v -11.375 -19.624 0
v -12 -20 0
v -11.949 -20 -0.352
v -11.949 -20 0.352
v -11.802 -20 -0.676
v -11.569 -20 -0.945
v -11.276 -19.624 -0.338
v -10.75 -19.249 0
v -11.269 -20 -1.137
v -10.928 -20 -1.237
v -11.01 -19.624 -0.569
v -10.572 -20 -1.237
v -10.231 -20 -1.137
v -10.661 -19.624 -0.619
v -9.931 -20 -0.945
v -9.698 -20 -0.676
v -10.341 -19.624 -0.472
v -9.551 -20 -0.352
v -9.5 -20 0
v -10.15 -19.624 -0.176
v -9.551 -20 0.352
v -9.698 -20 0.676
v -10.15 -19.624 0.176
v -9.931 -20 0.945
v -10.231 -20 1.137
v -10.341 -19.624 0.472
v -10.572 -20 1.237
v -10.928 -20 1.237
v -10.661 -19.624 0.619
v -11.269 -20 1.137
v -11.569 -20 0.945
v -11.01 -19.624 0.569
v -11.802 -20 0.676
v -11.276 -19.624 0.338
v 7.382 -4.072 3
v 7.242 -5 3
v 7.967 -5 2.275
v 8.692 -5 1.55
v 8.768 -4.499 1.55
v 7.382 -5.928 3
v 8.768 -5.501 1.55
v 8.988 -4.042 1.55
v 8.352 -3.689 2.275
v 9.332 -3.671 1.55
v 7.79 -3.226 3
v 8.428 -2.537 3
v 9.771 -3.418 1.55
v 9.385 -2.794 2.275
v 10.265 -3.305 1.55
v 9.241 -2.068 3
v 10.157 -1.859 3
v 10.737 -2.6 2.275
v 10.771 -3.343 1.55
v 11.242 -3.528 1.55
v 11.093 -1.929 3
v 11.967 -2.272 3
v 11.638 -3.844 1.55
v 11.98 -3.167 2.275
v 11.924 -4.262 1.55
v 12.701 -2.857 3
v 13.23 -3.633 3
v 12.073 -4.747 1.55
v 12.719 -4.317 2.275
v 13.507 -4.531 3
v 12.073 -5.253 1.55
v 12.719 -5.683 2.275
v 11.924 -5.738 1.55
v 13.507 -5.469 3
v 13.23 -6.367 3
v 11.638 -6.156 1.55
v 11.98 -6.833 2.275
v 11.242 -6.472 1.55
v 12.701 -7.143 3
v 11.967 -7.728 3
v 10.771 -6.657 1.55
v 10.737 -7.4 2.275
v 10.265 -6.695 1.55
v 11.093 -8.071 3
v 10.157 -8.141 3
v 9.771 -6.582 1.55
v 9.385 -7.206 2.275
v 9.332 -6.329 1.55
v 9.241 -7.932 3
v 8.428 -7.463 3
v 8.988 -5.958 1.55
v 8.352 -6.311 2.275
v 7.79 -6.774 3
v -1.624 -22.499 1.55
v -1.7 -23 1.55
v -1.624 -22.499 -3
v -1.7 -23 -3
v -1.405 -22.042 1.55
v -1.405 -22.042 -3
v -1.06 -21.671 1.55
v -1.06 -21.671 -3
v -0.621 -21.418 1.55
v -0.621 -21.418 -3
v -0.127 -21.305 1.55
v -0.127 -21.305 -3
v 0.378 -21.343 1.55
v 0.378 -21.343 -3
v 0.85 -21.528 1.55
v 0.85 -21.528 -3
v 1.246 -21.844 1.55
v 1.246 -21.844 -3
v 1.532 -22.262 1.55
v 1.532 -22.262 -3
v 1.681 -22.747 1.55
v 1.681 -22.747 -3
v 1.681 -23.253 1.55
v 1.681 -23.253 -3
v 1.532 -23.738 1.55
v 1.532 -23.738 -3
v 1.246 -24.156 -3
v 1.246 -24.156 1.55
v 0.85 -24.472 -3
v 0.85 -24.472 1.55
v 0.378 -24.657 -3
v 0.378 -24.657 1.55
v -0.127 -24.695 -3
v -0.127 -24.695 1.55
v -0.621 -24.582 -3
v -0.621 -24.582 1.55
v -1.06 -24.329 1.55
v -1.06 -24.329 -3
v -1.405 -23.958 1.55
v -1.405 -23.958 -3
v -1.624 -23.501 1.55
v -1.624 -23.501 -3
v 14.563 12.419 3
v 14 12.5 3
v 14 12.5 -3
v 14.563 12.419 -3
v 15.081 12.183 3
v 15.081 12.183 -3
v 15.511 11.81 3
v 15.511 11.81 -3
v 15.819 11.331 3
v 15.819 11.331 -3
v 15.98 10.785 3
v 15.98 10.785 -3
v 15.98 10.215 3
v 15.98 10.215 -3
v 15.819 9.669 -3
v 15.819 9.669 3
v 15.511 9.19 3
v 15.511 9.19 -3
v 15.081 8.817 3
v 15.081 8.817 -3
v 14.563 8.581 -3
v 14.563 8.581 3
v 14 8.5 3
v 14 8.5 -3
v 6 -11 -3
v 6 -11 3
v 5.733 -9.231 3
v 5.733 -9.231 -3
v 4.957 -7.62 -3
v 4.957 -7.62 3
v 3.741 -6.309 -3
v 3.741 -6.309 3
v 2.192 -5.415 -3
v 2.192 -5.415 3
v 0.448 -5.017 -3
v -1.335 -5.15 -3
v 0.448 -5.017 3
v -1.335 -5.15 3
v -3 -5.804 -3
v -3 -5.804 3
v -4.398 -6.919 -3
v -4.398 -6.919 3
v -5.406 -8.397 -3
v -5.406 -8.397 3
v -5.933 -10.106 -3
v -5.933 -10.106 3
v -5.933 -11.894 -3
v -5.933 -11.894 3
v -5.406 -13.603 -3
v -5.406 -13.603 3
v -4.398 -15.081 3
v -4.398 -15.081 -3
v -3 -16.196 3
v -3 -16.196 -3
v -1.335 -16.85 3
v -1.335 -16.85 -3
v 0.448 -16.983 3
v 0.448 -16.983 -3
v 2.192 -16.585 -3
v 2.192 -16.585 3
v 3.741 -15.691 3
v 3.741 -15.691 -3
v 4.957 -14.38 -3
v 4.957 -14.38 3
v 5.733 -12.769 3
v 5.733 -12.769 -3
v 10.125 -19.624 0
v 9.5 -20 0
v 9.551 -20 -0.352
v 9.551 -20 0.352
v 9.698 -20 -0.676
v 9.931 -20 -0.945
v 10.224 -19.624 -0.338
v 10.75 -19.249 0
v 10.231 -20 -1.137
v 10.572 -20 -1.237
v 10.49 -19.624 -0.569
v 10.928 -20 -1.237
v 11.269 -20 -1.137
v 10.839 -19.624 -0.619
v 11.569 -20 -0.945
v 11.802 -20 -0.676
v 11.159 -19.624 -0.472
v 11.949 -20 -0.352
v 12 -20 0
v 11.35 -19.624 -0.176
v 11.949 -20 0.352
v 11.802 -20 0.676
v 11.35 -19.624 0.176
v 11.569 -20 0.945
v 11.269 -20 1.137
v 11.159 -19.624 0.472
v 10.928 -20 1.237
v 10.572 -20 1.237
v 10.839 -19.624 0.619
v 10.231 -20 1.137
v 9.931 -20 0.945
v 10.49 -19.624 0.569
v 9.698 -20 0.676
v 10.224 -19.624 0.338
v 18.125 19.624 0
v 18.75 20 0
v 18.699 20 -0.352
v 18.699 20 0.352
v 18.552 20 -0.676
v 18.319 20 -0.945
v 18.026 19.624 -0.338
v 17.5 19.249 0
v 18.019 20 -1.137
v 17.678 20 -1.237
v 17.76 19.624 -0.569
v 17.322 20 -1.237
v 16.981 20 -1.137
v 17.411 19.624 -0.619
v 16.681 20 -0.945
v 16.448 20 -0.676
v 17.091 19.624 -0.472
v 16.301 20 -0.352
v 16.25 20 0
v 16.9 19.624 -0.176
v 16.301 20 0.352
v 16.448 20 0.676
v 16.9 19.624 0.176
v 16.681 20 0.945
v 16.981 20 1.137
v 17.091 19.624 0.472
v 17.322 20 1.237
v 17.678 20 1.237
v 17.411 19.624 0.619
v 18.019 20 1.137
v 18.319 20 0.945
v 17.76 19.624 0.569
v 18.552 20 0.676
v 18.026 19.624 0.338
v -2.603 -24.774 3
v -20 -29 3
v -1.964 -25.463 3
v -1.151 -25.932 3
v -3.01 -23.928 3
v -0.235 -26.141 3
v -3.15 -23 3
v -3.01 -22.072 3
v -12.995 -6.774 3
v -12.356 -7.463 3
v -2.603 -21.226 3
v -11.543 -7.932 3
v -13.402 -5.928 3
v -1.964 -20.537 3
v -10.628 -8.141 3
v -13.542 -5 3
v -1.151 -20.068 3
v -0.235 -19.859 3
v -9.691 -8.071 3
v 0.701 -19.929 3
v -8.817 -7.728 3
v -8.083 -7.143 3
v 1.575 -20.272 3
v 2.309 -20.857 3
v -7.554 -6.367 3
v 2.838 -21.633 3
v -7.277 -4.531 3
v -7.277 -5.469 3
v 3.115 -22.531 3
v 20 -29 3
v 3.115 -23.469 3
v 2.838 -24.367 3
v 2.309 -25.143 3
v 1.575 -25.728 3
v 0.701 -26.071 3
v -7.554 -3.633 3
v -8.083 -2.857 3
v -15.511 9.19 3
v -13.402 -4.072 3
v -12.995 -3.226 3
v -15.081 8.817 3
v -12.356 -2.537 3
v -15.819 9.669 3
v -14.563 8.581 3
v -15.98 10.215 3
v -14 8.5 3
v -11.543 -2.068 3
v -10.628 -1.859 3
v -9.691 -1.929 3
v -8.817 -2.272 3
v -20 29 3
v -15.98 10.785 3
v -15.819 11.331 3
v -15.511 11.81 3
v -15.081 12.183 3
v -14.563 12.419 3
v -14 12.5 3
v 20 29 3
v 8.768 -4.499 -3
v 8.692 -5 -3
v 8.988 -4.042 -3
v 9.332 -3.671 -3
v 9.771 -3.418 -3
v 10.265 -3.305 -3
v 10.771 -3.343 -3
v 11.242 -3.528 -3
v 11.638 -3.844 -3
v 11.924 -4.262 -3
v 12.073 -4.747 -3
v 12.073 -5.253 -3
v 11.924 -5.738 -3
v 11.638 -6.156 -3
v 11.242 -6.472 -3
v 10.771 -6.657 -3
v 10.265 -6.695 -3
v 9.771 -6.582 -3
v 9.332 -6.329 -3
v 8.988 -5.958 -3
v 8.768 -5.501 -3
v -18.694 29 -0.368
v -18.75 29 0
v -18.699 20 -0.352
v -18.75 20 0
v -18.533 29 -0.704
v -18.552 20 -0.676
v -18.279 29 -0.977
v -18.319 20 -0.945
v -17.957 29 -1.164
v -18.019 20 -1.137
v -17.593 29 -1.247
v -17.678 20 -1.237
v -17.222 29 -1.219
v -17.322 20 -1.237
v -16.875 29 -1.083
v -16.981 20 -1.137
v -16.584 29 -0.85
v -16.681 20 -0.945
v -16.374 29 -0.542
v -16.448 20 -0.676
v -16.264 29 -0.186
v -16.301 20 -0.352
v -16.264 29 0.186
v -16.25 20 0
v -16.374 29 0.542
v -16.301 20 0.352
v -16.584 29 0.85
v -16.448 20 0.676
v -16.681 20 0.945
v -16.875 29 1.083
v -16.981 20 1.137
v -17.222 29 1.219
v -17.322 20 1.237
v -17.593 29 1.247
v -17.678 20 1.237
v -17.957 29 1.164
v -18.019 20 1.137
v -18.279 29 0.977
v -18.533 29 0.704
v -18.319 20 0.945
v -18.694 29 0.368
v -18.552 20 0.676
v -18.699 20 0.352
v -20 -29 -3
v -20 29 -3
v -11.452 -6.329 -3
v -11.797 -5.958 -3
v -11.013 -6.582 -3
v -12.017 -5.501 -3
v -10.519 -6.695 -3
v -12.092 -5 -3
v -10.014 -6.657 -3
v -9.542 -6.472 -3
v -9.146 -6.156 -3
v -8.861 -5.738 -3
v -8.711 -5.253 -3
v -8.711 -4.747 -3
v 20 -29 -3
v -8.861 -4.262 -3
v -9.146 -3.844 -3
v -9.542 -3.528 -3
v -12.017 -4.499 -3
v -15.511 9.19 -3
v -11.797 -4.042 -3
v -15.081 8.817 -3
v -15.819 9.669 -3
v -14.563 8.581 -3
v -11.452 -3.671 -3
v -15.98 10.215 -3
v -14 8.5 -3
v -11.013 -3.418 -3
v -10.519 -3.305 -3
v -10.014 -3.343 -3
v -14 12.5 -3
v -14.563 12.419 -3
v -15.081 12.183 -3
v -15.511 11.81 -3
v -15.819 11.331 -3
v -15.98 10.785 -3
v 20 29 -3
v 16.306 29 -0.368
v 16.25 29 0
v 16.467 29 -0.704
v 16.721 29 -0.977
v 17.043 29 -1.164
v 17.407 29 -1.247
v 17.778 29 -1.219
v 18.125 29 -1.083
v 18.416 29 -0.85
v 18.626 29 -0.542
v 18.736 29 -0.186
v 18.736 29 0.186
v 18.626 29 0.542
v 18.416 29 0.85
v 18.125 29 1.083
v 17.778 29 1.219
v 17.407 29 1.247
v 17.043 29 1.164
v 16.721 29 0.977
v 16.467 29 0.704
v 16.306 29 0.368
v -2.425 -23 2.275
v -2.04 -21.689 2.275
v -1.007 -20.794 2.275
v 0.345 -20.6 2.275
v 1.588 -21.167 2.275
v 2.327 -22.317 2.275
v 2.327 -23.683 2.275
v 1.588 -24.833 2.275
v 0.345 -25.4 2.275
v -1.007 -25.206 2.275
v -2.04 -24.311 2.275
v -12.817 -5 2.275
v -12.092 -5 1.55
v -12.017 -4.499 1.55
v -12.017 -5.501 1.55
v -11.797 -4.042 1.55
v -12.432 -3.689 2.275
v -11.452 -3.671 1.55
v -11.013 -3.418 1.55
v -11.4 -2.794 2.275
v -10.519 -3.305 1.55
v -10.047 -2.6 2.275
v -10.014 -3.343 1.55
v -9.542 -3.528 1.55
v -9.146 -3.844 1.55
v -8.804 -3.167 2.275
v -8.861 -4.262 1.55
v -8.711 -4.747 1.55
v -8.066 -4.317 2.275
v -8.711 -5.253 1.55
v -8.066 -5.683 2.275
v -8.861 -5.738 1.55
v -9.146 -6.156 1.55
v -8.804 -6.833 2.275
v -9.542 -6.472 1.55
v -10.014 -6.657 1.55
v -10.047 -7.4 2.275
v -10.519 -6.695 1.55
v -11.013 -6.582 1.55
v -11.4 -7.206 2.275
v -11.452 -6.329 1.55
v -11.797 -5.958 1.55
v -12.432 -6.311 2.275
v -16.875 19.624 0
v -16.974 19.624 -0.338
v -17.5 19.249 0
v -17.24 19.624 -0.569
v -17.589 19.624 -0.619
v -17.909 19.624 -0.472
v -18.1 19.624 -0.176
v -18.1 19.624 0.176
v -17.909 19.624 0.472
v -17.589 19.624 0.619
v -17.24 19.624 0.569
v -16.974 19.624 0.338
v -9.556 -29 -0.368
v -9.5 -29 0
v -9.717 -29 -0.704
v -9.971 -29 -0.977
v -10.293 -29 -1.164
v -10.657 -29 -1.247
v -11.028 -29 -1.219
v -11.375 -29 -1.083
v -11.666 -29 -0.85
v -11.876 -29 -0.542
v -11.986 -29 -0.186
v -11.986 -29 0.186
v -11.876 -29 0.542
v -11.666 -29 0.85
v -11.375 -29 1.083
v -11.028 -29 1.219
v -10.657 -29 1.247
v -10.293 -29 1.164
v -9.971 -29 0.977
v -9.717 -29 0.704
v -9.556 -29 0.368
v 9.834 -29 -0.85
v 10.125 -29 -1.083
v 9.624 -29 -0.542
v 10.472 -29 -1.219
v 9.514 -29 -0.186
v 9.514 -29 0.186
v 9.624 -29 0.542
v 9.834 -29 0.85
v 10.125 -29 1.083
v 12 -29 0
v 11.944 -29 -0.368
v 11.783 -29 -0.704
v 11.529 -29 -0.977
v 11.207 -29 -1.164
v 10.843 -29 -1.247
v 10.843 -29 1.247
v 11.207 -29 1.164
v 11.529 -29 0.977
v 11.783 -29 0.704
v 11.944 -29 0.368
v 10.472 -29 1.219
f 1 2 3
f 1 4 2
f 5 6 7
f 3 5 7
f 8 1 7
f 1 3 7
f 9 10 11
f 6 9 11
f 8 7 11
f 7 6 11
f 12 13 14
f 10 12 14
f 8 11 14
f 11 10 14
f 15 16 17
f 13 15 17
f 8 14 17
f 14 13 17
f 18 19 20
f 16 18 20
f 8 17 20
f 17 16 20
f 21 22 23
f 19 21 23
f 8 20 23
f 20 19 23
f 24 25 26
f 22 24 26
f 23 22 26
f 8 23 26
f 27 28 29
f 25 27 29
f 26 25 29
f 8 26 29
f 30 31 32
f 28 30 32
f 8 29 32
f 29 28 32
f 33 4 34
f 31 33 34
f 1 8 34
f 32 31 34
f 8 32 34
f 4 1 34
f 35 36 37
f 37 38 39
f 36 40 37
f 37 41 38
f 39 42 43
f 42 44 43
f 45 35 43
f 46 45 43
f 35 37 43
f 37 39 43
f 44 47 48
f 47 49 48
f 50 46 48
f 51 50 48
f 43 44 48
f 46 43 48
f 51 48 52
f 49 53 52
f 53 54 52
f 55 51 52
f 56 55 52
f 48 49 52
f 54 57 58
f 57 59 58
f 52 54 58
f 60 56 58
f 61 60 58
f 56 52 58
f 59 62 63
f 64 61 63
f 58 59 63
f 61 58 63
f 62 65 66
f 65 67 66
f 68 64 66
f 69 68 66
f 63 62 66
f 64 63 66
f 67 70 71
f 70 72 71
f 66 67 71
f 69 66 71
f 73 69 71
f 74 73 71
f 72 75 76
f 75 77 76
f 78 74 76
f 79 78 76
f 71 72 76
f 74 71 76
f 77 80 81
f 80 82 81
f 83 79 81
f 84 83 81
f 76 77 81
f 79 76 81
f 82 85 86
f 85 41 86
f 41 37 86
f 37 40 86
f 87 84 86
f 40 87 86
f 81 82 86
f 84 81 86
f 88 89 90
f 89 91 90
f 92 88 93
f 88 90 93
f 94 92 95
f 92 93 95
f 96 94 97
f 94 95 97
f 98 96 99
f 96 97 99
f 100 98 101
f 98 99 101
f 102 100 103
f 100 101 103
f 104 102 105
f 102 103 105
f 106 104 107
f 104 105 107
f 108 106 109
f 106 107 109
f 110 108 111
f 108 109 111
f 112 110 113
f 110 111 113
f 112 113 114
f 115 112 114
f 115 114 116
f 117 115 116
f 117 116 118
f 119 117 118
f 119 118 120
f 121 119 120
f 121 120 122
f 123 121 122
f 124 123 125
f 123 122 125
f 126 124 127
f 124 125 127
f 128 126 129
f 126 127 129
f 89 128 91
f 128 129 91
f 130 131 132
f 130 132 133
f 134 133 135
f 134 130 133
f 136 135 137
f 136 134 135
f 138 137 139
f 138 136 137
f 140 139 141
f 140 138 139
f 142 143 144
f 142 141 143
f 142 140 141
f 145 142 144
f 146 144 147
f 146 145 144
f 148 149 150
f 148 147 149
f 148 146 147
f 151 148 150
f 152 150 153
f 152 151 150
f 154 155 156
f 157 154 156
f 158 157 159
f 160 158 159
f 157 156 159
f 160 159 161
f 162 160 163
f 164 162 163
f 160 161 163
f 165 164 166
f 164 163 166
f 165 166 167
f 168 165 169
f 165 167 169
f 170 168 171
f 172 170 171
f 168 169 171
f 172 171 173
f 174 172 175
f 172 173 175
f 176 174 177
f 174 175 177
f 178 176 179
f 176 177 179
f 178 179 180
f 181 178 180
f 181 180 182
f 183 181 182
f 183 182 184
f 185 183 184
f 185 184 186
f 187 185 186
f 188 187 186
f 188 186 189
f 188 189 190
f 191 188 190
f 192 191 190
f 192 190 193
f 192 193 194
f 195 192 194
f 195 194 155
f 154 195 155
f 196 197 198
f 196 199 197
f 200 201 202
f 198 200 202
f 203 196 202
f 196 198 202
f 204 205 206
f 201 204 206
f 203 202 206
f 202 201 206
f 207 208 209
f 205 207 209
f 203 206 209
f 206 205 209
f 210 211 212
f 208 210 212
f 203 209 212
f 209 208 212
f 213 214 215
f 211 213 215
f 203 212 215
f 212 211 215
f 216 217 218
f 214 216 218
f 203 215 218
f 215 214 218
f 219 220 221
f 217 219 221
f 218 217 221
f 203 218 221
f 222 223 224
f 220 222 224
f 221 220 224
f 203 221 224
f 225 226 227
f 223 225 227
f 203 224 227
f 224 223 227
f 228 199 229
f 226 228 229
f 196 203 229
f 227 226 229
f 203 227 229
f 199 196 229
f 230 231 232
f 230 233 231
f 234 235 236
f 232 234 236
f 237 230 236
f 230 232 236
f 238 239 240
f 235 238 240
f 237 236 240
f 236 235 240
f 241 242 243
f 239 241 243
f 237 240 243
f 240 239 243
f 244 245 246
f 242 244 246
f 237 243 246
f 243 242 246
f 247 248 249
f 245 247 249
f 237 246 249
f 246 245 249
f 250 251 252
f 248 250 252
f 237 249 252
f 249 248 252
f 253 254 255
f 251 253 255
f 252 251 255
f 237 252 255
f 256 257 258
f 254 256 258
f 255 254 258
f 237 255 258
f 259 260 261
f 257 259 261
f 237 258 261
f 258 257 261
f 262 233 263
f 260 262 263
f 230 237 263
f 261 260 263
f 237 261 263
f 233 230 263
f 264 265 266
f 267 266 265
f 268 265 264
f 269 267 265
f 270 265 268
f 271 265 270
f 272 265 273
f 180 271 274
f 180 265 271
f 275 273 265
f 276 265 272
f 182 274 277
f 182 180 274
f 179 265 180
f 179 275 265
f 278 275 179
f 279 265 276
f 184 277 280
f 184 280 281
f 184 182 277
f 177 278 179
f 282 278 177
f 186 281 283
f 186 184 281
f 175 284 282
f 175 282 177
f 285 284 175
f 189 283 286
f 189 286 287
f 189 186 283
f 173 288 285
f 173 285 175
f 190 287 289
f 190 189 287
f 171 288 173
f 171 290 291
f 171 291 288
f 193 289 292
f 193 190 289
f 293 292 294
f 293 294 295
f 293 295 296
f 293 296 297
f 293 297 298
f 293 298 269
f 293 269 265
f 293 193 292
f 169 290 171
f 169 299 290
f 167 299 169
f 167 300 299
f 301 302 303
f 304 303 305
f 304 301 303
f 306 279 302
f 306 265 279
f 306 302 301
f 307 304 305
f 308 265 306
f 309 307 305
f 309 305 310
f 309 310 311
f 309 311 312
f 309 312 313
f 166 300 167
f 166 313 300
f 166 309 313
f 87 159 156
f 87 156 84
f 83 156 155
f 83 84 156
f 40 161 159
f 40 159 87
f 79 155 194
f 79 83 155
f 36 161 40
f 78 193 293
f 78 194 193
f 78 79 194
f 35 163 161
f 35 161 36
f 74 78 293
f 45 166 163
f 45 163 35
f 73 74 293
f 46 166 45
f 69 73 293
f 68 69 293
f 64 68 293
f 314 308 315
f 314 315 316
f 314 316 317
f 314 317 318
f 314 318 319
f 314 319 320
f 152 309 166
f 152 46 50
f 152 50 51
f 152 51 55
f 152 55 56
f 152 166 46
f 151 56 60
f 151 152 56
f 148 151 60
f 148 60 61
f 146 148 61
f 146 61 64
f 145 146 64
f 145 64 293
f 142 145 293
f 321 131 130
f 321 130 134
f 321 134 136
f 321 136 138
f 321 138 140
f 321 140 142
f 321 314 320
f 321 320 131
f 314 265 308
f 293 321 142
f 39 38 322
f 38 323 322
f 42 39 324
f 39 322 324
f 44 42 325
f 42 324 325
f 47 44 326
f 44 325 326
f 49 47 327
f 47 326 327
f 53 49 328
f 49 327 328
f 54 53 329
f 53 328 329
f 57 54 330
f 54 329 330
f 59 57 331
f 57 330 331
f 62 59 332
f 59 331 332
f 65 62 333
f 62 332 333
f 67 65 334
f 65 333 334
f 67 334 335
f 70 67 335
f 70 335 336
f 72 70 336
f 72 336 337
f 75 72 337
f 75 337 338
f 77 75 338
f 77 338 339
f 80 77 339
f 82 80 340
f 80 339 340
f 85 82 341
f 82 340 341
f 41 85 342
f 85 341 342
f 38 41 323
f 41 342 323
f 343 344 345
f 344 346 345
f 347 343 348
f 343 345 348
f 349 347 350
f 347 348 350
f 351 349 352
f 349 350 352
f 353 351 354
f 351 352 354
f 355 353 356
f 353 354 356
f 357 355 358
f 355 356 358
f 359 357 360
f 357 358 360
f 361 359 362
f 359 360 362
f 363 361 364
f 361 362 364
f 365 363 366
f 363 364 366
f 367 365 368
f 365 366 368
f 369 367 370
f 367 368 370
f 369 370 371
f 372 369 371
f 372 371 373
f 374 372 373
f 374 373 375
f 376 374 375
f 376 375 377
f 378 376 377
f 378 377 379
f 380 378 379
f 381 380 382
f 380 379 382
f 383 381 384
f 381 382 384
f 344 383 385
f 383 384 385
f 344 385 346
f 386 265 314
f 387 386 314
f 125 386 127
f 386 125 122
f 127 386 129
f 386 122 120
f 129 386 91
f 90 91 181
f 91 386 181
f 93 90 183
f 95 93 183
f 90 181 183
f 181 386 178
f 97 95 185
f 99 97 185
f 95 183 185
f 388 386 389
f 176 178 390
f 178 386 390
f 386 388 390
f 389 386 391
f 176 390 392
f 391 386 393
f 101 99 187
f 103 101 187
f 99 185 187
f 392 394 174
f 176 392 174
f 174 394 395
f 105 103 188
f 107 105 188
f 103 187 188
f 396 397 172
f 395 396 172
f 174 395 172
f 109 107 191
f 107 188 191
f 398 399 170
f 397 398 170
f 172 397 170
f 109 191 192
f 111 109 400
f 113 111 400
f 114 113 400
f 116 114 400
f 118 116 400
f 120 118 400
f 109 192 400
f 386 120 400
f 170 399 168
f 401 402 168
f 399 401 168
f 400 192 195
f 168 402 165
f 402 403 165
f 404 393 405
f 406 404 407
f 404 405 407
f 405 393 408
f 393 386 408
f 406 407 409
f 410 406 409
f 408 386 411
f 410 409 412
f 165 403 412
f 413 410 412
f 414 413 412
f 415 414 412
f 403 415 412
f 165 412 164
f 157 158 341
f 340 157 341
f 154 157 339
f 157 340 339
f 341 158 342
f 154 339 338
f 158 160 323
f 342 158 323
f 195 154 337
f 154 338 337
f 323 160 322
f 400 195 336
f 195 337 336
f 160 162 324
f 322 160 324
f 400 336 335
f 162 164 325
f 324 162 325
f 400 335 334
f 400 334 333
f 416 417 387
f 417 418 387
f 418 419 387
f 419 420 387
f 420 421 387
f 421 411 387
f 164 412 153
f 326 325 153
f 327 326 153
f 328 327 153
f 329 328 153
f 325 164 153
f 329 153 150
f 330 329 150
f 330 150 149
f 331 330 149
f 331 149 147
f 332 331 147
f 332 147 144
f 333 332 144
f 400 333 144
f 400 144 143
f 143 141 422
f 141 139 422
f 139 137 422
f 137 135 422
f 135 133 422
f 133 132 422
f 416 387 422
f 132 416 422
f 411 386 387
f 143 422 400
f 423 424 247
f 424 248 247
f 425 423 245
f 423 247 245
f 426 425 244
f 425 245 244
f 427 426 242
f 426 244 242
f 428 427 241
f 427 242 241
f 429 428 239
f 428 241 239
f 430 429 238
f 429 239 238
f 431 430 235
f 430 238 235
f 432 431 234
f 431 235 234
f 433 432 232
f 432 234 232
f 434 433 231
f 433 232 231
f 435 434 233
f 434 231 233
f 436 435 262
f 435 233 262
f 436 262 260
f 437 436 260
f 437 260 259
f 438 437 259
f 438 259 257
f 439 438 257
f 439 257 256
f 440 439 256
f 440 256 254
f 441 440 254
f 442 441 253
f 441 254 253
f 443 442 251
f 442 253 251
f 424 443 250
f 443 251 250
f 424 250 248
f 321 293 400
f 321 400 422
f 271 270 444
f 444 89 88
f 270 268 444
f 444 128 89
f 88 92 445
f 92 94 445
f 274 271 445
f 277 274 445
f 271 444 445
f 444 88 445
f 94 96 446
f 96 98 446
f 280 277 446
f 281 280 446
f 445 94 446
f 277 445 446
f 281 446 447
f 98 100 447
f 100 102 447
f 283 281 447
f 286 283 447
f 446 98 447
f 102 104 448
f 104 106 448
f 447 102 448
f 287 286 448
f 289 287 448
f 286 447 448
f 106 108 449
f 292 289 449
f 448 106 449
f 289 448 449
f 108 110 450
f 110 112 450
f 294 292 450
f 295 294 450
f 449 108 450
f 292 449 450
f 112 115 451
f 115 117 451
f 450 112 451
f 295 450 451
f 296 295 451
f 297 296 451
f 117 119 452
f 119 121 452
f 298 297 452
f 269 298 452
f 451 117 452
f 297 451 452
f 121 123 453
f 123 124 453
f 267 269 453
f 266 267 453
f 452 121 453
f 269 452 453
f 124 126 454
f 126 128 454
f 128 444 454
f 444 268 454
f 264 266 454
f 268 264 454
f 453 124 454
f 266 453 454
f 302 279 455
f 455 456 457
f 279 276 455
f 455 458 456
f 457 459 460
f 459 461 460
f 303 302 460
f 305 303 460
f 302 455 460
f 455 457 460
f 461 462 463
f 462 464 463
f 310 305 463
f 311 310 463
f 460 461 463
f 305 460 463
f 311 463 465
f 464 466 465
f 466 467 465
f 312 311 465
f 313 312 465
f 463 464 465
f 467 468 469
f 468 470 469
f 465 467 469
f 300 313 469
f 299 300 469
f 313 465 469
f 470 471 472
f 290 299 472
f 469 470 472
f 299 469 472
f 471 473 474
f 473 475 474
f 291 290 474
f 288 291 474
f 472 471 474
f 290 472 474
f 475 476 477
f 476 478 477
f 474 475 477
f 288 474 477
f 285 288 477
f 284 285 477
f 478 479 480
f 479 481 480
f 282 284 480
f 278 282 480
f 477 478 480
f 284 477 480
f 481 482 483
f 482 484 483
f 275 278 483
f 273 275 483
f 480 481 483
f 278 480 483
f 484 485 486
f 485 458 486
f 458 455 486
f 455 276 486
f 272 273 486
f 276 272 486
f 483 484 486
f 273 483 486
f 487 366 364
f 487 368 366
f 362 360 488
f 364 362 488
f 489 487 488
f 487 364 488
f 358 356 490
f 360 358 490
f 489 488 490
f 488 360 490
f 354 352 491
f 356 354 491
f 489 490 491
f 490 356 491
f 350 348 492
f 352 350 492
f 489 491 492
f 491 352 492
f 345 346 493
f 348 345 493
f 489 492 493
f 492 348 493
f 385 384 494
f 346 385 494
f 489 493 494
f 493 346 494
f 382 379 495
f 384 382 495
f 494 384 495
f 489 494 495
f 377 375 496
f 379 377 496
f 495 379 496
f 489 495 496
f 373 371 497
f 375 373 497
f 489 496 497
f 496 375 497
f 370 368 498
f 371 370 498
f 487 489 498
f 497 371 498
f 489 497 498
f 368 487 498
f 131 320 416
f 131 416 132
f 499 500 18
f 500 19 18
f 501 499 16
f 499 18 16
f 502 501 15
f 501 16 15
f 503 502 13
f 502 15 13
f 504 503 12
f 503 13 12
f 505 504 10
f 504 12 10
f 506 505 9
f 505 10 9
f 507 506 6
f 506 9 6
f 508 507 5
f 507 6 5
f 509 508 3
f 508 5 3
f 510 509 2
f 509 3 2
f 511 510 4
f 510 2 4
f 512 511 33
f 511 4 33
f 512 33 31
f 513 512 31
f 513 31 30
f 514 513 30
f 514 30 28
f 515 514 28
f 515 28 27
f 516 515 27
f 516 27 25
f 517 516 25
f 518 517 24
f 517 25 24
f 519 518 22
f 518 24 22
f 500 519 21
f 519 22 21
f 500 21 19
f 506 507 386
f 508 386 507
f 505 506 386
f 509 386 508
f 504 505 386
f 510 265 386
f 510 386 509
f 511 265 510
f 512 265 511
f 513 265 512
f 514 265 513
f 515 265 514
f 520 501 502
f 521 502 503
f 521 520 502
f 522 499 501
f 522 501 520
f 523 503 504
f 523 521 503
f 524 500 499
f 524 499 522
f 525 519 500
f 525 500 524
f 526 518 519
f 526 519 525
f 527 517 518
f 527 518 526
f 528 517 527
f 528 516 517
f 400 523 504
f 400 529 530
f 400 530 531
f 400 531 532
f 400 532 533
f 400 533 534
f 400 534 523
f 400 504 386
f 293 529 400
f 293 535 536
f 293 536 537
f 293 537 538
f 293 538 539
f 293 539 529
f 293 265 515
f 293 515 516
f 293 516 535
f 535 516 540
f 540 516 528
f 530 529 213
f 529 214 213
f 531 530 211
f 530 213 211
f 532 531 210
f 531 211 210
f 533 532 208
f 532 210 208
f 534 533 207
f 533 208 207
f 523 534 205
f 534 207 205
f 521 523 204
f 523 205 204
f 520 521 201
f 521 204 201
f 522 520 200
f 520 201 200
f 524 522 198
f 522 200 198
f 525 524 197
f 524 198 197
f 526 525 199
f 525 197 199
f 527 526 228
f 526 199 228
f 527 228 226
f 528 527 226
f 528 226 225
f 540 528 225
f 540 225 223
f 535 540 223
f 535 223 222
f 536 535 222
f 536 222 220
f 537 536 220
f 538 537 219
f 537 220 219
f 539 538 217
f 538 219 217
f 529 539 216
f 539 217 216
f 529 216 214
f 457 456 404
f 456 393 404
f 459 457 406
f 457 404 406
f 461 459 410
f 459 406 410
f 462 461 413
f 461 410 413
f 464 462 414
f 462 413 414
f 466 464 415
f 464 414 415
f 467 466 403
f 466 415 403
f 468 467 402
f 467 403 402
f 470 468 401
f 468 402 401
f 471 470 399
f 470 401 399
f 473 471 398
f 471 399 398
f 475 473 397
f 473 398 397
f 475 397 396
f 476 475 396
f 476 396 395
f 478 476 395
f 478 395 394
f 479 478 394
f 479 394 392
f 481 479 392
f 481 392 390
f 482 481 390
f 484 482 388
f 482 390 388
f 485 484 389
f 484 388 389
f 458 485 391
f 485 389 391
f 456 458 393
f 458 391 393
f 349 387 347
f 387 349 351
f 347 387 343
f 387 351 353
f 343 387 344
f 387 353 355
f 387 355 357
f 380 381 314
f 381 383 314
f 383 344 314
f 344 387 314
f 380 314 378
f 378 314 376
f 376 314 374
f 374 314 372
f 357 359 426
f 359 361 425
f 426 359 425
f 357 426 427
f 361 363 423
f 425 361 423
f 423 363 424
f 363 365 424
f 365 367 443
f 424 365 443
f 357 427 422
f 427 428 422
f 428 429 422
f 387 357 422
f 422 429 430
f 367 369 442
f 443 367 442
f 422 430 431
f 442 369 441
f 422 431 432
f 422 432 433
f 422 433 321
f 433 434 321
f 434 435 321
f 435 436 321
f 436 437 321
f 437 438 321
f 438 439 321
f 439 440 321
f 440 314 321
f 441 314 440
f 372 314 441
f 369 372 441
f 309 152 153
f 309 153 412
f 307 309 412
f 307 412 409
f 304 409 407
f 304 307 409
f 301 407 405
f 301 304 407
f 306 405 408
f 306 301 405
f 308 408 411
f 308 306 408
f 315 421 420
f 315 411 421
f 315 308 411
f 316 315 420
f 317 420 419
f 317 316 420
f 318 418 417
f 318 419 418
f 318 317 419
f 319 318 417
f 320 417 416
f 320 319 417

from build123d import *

# Parameters (mm, degrees)
SKETCH1_W                                           = 40
SKETCH1_H                                           = 58
BOSS_EXTRUDE1_DEPTH                                 = 3
SKETCH2_R                                           = 6
CUT_EXTRUDE1_DEPTH                                  = 36.73513677
CSK_FOR_M3_COUNTERSUNK_FLAT_HEAD_SCREW1_D           = 3.4
CSK_FOR_M3_COUNTERSUNK_FLAT_HEAD_SCREW1_CSINK_D     = 6.3
CSK_FOR_M3_COUNTERSUNK_FLAT_HEAD_SCREW1_CSINK_ANGLE = 90
TAP_DRILL_FOR_M3_TAP1_D                             = 2.5
TAP_DRILL_FOR_M3_TAP1_DEPTH                         = 9
TAP_DRILL_FOR_M3_TAP1_TIP                           = 0.751075774
TAP_DRILL_FOR_M3_TAP2_D                             = 2.5
TAP_DRILL_FOR_M3_TAP2_DEPTH                         = 9
TAP_DRILL_FOR_M3_TAP2_TIP                           = 0.751075774
CUT_EXTRUDE3_DEPTH                                  = 36.73513677


with BuildPart() as part:
    # Sketch1 → Boss-Extrude1 (new, symmetric)
    with BuildSketch(Plane.XY):
        Rectangle(SKETCH1_W, SKETCH1_H)
    extrude(amount=BOSS_EXTRUDE1_DEPTH, both=True)

    # Sketch2 → Cut-Extrude1 (cut, through all)
    with BuildSketch(Plane.XY.offset(3)):
        with Locations((0, -11)):
            Circle(SKETCH2_R)
    extrude(amount=-CUT_EXTRUDE1_DEPTH, mode=Mode.SUBTRACT)

    # CSK for M3 Countersunk Flat Head Screw1 (through all)
    with Locations(Plane.XY.offset(3)):
        with Locations((0, -23), (-10.392304845, -5), (10.392304845, -5)):
            CounterSinkHole(CSK_FOR_M3_COUNTERSUNK_FLAT_HEAD_SCREW1_D / 2, CSK_FOR_M3_COUNTERSUNK_FLAT_HEAD_SCREW1_CSINK_D / 2, counter_sink_angle=CSK_FOR_M3_COUNTERSUNK_FLAT_HEAD_SCREW1_CSINK_ANGLE)

    # Tap Drill for M3 Tap1
    with Locations(Plane(origin=(0, -29, 0), x_dir=(-1, 0, 0), z_dir=(0, -1, 0))):
        with Locations((10.75, 0), (-10.75, 0)):
            Hole(TAP_DRILL_FOR_M3_TAP1_D / 2, depth=TAP_DRILL_FOR_M3_TAP1_DEPTH)
            with Locations((0, 0, -(TAP_DRILL_FOR_M3_TAP1_DEPTH + TAP_DRILL_FOR_M3_TAP1_TIP / 2))):  # 118° drill point
                Cone(0, TAP_DRILL_FOR_M3_TAP1_D / 2, TAP_DRILL_FOR_M3_TAP1_TIP, mode=Mode.SUBTRACT)

    # Tap Drill for M3 Tap2
    with Locations(Plane(origin=(0, 29, 0), x_dir=(1, 0, 0), z_dir=(0, 1, 0))):
        with Locations((17.5, 0), (-17.5, 0)):
            Hole(TAP_DRILL_FOR_M3_TAP2_D / 2, depth=TAP_DRILL_FOR_M3_TAP2_DEPTH)
            with Locations((0, 0, -(TAP_DRILL_FOR_M3_TAP2_DEPTH + TAP_DRILL_FOR_M3_TAP2_TIP / 2))):  # 118° drill point
                Cone(0, TAP_DRILL_FOR_M3_TAP2_D / 2, TAP_DRILL_FOR_M3_TAP2_TIP, mode=Mode.SUBTRACT)

    # Sketch10 → Cut-Extrude3 (cut, through all)
    with BuildSketch(Plane.XY.offset(3)):
        with BuildLine():
            Line((-14, 12.5), (14, 12.5))
            ThreePointArc((14, 12.5), (16, 10.5), (14, 8.5))
            Line((14, 8.5), (-14, 8.5))
            ThreePointArc((-14, 8.5), (-16, 10.5), (-14, 12.5))
        make_face()
    extrude(amount=-CUT_EXTRUDE3_DEPTH, mode=Mode.SUBTRACT)


solid = part.part
